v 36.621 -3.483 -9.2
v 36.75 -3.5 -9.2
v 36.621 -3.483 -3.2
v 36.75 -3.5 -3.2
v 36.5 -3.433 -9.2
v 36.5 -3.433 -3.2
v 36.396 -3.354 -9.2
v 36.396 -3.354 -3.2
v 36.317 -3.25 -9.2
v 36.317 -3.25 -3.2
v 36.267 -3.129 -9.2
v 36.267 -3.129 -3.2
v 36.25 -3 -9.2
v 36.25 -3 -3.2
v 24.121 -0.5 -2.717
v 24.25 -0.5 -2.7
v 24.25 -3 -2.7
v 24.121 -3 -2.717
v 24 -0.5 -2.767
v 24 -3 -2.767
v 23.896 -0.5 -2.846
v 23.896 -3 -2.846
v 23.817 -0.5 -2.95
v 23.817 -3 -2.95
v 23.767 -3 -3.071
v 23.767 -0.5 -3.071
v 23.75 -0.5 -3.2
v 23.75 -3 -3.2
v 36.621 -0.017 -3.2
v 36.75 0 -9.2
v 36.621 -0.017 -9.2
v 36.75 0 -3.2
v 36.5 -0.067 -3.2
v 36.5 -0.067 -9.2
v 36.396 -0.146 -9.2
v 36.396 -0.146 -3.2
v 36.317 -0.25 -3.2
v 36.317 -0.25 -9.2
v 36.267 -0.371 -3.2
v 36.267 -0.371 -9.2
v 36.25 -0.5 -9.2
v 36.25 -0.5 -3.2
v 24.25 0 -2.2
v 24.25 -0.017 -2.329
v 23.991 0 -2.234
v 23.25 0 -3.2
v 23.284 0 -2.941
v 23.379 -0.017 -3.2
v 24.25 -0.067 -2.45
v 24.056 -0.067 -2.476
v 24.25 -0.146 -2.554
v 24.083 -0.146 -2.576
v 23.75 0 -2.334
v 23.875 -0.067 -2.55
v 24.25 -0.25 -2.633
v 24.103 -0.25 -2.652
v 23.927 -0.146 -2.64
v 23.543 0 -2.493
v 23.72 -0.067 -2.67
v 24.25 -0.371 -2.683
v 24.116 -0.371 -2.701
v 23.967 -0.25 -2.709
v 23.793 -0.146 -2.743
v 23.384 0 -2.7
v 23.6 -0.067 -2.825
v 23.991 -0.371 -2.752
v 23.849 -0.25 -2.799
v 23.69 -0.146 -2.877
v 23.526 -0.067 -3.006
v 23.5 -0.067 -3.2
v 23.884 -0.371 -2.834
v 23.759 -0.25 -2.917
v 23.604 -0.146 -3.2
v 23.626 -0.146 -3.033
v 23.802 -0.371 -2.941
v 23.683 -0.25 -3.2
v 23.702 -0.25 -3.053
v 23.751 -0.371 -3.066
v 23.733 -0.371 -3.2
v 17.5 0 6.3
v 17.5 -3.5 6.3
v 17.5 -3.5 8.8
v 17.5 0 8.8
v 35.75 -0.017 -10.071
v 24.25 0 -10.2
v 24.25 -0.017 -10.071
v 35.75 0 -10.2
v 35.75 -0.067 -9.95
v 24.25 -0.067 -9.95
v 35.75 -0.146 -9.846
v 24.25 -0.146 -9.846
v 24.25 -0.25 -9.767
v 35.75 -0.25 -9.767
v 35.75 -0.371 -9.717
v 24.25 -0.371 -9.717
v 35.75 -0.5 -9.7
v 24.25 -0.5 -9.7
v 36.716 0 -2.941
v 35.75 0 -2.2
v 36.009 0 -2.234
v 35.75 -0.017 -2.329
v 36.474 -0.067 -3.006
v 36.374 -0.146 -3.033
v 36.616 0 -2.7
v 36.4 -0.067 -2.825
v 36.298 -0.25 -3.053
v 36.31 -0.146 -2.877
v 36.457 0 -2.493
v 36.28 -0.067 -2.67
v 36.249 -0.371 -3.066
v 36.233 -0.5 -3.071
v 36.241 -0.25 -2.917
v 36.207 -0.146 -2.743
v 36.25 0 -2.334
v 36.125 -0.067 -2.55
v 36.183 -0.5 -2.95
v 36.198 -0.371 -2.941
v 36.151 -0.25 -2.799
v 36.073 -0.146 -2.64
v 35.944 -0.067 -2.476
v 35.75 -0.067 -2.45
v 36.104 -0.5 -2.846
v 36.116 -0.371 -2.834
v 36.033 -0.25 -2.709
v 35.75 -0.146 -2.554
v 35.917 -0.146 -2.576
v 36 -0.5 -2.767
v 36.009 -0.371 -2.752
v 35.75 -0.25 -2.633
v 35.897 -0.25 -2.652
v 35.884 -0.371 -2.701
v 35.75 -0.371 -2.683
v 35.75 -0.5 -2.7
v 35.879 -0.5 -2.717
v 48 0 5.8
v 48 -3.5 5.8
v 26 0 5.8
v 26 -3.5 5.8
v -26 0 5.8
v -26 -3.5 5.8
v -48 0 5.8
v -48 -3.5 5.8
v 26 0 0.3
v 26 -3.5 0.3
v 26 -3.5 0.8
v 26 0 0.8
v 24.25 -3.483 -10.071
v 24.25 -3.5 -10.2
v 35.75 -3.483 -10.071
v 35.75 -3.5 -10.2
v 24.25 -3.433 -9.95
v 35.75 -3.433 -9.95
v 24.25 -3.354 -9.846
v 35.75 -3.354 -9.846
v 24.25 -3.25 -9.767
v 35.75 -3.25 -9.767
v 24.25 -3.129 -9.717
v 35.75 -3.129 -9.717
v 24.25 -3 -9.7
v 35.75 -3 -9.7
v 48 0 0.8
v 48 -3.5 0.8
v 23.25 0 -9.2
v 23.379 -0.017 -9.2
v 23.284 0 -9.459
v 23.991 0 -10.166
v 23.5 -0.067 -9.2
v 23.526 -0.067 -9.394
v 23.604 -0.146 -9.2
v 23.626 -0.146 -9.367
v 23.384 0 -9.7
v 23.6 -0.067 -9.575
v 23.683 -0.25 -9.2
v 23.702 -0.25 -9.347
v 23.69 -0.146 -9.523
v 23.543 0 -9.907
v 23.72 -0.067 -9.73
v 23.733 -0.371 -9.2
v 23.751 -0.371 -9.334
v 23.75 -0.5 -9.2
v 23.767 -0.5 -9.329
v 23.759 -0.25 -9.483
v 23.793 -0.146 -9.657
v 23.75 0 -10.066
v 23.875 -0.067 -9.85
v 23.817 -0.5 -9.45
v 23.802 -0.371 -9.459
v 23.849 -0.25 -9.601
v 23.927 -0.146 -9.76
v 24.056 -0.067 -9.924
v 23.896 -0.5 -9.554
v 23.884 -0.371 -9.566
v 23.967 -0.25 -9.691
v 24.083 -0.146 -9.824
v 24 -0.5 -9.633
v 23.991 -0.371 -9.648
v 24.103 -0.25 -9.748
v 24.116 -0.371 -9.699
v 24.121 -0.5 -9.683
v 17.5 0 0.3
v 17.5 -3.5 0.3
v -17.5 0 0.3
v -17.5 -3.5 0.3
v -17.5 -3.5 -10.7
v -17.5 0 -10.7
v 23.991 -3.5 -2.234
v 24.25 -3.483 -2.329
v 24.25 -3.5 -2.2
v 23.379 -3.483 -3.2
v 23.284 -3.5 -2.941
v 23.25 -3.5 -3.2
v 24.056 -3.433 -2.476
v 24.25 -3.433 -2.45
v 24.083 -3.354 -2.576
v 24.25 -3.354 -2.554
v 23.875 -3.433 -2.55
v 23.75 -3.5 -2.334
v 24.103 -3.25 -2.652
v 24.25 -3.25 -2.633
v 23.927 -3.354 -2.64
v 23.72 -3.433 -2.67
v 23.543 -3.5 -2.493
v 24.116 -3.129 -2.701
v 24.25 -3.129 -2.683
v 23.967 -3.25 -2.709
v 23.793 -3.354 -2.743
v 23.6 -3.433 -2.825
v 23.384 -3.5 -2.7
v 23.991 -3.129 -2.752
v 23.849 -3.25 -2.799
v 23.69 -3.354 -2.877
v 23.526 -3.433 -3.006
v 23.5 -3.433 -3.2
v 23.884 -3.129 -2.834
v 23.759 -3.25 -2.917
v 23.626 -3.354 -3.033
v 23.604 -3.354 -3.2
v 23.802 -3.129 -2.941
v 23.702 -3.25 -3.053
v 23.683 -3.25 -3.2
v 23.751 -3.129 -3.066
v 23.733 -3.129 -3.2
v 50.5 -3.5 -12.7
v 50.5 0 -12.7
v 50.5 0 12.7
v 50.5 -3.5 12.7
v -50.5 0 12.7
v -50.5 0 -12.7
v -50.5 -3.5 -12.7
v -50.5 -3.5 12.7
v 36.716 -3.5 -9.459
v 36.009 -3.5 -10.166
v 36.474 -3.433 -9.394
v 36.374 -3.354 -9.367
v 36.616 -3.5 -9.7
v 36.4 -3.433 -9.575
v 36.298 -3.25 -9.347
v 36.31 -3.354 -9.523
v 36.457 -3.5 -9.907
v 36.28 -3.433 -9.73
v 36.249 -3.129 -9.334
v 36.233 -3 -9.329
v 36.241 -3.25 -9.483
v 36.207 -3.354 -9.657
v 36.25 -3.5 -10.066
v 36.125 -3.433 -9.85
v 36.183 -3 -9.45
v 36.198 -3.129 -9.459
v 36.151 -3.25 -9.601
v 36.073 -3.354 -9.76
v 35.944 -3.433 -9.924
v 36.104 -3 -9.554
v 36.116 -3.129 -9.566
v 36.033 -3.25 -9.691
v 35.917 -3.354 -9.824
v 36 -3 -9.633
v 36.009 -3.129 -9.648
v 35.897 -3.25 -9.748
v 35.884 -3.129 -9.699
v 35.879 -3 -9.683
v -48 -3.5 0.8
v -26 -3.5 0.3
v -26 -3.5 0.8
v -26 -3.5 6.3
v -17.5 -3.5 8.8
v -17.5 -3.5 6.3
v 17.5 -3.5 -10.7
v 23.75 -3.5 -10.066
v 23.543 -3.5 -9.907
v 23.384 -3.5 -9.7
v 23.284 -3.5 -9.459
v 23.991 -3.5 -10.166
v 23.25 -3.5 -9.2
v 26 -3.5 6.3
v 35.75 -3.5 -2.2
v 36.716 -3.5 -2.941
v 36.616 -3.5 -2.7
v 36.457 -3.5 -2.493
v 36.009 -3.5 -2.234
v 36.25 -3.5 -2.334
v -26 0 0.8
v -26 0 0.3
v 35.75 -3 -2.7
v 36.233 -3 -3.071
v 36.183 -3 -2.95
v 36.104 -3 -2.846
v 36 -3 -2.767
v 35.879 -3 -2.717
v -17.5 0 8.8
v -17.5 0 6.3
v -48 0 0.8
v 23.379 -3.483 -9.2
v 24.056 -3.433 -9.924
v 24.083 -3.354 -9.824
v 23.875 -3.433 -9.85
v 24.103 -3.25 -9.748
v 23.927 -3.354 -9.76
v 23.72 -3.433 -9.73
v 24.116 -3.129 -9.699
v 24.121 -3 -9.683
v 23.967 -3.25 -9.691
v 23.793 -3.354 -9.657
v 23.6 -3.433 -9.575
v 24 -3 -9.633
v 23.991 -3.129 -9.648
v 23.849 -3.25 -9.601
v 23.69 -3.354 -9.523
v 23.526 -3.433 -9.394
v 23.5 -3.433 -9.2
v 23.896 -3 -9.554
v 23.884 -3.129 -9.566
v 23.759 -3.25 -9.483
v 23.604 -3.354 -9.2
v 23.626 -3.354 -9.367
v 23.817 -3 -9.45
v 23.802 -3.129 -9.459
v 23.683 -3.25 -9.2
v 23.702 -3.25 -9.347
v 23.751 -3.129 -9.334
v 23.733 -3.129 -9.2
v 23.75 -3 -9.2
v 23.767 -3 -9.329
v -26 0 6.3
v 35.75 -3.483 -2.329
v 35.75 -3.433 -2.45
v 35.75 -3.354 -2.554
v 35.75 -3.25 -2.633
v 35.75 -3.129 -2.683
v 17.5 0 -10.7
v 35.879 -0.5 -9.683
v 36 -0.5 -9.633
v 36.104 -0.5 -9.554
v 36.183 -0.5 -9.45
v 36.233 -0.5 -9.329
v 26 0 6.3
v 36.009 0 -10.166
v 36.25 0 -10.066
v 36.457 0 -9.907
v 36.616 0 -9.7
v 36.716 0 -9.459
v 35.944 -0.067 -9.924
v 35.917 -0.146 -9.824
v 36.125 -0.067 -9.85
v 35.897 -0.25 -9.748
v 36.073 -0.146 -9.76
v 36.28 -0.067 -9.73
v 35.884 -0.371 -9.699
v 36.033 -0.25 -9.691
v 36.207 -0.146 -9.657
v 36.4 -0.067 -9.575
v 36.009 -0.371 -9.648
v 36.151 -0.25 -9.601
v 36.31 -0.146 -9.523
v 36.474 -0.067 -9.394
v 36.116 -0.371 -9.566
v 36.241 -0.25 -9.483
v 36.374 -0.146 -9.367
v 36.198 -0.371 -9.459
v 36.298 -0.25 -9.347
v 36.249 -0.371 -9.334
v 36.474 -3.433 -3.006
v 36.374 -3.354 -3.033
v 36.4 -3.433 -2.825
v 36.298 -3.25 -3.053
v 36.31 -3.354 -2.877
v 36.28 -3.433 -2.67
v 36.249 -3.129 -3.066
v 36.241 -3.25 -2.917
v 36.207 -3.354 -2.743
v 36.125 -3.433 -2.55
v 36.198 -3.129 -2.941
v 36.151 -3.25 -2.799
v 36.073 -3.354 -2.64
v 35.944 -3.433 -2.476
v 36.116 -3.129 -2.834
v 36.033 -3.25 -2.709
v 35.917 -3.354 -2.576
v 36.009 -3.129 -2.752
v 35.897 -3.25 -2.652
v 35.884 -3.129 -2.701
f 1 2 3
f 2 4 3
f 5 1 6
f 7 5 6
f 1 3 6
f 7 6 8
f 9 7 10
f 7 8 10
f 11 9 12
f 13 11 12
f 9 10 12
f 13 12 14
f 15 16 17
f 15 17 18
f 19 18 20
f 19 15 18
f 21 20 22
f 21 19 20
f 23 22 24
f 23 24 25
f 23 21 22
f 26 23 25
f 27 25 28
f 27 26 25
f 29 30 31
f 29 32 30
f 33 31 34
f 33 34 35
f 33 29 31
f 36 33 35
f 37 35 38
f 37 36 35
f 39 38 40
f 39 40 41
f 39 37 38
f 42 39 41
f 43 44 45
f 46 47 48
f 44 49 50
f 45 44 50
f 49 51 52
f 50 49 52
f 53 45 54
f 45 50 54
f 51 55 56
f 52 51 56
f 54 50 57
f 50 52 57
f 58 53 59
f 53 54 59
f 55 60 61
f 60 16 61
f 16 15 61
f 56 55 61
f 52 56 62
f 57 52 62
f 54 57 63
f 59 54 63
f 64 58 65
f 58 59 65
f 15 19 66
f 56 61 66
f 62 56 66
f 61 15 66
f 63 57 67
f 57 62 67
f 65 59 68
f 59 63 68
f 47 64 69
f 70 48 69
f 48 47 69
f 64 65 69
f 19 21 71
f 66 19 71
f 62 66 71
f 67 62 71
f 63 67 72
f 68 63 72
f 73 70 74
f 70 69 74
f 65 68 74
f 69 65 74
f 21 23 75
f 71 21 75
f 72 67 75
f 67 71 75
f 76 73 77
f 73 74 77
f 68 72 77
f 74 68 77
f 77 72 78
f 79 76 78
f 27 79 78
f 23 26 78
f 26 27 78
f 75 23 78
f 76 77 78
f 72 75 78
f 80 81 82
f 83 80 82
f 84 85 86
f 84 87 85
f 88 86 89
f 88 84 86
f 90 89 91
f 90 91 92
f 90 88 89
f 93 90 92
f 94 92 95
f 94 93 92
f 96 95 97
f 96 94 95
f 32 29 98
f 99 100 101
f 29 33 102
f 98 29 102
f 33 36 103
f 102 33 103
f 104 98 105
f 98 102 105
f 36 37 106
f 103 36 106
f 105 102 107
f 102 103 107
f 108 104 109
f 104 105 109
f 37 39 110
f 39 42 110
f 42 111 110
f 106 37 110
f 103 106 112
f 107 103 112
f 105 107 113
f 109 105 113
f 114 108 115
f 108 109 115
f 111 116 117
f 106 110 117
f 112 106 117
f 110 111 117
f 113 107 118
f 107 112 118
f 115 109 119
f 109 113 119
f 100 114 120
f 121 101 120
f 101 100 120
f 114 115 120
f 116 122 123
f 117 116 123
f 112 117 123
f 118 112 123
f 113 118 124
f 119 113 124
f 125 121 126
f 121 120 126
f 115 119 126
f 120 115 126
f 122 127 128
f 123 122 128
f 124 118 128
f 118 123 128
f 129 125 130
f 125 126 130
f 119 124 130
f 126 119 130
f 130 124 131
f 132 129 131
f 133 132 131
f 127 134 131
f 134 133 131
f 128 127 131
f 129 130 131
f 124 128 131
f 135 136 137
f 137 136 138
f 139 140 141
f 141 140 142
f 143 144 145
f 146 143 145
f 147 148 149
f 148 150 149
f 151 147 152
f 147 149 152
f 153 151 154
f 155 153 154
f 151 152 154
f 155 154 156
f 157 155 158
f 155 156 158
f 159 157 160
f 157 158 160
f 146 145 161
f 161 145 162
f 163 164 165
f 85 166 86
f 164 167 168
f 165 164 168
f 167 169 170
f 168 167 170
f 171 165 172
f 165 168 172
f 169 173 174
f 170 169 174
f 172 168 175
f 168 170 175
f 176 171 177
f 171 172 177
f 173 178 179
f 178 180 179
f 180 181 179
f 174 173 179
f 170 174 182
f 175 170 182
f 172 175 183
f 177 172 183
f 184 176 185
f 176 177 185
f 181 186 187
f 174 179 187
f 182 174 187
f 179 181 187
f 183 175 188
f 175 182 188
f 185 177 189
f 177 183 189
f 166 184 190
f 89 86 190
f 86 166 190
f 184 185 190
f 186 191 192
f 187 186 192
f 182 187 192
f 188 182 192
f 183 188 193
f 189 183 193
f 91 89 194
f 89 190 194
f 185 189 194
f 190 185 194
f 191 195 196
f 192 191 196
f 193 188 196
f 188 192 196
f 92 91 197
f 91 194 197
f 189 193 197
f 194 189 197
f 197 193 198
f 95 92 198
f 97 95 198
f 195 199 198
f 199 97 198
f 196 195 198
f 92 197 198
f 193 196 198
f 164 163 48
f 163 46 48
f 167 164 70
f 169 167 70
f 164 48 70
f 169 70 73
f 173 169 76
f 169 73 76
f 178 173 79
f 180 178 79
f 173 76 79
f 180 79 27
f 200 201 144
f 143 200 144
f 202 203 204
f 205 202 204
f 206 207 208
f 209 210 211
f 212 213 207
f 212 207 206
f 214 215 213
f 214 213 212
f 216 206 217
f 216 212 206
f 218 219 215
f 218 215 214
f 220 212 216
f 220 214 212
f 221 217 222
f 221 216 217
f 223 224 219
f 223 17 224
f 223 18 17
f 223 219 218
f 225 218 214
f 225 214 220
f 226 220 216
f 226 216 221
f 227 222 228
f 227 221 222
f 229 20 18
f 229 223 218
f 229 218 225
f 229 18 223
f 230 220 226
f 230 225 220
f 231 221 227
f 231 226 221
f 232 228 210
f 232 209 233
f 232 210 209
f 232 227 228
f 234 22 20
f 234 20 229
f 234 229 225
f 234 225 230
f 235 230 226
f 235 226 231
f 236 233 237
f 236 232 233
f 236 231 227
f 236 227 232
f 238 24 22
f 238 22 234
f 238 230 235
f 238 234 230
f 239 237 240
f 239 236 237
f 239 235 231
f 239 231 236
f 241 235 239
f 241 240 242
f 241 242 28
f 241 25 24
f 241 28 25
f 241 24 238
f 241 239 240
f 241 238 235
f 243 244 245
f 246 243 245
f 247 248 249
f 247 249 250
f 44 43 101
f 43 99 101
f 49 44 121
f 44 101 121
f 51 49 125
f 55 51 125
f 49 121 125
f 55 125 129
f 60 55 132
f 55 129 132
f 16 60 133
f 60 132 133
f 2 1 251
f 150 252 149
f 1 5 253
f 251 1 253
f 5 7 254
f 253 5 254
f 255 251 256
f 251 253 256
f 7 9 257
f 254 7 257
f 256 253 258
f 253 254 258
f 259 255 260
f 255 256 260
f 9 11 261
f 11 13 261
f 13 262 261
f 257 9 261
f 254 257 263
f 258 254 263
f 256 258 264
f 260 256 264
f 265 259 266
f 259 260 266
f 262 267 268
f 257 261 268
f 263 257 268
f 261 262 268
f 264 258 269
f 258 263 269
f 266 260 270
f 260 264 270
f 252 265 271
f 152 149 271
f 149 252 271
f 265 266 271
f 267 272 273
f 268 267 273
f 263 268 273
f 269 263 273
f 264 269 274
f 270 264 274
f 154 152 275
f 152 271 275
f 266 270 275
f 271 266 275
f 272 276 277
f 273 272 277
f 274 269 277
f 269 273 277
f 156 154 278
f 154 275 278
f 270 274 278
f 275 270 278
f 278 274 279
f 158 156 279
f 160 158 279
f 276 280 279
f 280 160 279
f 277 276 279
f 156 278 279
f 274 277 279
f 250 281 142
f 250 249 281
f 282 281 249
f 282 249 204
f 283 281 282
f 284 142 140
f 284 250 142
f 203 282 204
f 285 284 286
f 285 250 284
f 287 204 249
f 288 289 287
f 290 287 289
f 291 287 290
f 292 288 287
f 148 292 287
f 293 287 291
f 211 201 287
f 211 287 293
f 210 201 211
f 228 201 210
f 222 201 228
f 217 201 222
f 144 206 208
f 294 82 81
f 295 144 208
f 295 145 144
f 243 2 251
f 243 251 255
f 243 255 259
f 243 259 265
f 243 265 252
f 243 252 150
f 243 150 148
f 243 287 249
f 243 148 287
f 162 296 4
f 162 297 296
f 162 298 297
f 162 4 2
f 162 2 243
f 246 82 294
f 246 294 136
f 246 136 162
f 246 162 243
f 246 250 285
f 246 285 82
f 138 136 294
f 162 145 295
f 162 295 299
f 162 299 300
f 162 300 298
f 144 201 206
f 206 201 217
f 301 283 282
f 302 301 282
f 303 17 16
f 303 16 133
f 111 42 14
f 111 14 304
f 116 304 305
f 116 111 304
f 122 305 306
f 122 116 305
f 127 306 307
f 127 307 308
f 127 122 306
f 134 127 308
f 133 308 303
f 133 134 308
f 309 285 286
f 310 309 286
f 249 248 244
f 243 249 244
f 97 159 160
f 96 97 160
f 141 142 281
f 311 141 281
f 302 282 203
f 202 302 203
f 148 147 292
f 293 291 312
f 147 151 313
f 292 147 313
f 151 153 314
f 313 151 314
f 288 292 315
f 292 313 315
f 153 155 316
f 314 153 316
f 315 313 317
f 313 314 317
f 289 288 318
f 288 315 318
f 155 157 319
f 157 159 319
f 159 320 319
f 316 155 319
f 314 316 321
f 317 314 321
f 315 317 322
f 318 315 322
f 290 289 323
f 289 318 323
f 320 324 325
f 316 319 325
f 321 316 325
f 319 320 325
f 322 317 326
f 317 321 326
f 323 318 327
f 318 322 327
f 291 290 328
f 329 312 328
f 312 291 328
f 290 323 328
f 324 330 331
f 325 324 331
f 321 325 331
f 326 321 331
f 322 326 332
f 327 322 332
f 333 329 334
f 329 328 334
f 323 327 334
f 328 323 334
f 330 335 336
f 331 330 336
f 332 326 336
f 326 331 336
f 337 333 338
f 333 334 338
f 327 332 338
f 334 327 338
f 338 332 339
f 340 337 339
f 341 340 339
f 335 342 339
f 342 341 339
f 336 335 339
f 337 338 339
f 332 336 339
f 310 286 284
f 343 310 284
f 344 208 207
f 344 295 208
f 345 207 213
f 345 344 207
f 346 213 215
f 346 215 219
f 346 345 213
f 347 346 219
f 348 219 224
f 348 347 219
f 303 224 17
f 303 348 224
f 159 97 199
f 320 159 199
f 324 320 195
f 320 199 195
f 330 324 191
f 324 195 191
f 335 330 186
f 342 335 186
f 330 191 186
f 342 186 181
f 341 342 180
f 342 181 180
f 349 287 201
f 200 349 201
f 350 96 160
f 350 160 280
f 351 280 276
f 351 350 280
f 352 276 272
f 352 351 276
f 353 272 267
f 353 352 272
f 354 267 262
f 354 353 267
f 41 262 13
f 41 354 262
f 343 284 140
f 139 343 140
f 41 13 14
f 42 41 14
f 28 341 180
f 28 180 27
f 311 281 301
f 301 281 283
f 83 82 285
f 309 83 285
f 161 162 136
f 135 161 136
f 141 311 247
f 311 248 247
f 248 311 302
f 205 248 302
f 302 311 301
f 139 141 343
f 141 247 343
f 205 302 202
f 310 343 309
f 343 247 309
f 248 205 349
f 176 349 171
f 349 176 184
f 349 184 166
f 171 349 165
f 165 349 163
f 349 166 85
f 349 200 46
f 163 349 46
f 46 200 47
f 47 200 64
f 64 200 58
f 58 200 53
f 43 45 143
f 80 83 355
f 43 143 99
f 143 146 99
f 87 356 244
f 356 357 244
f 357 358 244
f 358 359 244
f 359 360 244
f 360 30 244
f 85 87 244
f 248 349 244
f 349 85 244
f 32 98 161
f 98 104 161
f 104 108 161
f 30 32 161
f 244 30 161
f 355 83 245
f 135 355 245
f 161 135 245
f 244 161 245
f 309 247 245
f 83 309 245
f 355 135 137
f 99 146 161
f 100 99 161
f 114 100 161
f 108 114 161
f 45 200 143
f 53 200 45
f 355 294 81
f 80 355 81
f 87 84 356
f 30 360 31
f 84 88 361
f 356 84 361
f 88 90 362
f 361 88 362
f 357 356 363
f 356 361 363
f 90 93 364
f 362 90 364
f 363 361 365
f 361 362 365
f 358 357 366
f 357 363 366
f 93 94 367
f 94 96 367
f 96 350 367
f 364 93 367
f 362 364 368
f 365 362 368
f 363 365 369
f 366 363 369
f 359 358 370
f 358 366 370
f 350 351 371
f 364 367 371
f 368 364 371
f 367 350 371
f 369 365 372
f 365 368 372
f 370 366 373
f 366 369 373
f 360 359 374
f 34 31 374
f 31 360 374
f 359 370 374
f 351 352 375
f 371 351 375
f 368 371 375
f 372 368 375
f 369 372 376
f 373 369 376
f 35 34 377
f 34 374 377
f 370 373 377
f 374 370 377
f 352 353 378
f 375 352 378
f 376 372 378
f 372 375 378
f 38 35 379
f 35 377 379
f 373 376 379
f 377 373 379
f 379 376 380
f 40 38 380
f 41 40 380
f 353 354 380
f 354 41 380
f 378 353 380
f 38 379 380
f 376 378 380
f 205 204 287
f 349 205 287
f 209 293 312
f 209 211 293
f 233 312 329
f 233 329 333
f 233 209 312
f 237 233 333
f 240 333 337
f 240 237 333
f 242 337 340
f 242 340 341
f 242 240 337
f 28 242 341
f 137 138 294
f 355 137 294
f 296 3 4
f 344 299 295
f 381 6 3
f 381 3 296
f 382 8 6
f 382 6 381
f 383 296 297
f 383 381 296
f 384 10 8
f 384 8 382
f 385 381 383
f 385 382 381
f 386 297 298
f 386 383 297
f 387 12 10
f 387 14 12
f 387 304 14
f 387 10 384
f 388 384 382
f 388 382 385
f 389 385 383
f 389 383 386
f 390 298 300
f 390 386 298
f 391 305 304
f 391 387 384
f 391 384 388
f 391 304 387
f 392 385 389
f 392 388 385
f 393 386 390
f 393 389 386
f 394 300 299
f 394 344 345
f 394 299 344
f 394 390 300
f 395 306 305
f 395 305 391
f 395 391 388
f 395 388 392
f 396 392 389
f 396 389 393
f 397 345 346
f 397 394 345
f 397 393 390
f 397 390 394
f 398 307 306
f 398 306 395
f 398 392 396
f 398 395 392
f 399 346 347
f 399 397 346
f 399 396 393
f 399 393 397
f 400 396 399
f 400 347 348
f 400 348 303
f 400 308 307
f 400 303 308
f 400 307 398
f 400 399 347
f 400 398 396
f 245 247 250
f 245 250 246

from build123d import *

# Parameters (mm, degrees)
SKETCH_W          = 101
SKETCH_H          = 25.4
PAD_DEPTH         = 3.5
SKETCH001_W       = 12.5
SKETCH001_H       = 7
POCKET_DEPTH      = 3.501
POCKET_DEPTH_BACK = 0.001
FILLET_R          = 0.5


with BuildPart() as part:
    # Sketch → Pad (new body)
    with BuildSketch(Plane.XZ):
        Rectangle(SKETCH_W, SKETCH_H)
    extrude(amount=PAD_DEPTH)

    # Sketch001 (on DatumPlane) → Pocket (cut, two sides)
    with BuildSketch(Plane.XZ.offset(3.5)) as pocket_sk:
        Polygon((-48, 5.8), (-48, 0.8), (-26, 0.8), (-26, 0.3), (-17.5, 0.3), (-17.5, -10.7), (17.5, -10.7), (17.5, 0.3), (26, 0.3), (26, 0.8), (48, 0.8), (48, 5.8), (26, 5.8), (26, 6.3), (17.5, 6.3), (17.5, 8.8), (-17.5, 8.8), (-17.5, 6.3), (-26, 6.3), (-26, 5.8), align=None)
        with Locations((30, -6.2)):
            Rectangle(SKETCH001_W, SKETCH001_H)
    extrude(amount=-POCKET_DEPTH, mode=Mode.SUBTRACT)
    extrude(pocket_sk.sketch, amount=POCKET_DEPTH_BACK, mode=Mode.SUBTRACT)

    # Fillet
    fillet_edges = [part.edges().sort_by_distance(p)[0] for p in [
        (23.75, -3.5, -6.2),
        (23.75, -1.75, -9.7),
        (23.75, 0, -6.2),
        (23.75, -1.75, -2.7),
        (30, -3.5, -9.7),
        (36.25, -1.75, -9.7),
        (30, 0, -9.7),
        (30, -3.5, -2.7),
        (30, 0, -2.7),
        (36.25, -1.75, -2.7),
        (36.25, -3.5, -6.2),
        (36.25, 0, -6.2),
    ]]
    fillet(fillet_edges, radius=FILLET_R)


solid = part.part
